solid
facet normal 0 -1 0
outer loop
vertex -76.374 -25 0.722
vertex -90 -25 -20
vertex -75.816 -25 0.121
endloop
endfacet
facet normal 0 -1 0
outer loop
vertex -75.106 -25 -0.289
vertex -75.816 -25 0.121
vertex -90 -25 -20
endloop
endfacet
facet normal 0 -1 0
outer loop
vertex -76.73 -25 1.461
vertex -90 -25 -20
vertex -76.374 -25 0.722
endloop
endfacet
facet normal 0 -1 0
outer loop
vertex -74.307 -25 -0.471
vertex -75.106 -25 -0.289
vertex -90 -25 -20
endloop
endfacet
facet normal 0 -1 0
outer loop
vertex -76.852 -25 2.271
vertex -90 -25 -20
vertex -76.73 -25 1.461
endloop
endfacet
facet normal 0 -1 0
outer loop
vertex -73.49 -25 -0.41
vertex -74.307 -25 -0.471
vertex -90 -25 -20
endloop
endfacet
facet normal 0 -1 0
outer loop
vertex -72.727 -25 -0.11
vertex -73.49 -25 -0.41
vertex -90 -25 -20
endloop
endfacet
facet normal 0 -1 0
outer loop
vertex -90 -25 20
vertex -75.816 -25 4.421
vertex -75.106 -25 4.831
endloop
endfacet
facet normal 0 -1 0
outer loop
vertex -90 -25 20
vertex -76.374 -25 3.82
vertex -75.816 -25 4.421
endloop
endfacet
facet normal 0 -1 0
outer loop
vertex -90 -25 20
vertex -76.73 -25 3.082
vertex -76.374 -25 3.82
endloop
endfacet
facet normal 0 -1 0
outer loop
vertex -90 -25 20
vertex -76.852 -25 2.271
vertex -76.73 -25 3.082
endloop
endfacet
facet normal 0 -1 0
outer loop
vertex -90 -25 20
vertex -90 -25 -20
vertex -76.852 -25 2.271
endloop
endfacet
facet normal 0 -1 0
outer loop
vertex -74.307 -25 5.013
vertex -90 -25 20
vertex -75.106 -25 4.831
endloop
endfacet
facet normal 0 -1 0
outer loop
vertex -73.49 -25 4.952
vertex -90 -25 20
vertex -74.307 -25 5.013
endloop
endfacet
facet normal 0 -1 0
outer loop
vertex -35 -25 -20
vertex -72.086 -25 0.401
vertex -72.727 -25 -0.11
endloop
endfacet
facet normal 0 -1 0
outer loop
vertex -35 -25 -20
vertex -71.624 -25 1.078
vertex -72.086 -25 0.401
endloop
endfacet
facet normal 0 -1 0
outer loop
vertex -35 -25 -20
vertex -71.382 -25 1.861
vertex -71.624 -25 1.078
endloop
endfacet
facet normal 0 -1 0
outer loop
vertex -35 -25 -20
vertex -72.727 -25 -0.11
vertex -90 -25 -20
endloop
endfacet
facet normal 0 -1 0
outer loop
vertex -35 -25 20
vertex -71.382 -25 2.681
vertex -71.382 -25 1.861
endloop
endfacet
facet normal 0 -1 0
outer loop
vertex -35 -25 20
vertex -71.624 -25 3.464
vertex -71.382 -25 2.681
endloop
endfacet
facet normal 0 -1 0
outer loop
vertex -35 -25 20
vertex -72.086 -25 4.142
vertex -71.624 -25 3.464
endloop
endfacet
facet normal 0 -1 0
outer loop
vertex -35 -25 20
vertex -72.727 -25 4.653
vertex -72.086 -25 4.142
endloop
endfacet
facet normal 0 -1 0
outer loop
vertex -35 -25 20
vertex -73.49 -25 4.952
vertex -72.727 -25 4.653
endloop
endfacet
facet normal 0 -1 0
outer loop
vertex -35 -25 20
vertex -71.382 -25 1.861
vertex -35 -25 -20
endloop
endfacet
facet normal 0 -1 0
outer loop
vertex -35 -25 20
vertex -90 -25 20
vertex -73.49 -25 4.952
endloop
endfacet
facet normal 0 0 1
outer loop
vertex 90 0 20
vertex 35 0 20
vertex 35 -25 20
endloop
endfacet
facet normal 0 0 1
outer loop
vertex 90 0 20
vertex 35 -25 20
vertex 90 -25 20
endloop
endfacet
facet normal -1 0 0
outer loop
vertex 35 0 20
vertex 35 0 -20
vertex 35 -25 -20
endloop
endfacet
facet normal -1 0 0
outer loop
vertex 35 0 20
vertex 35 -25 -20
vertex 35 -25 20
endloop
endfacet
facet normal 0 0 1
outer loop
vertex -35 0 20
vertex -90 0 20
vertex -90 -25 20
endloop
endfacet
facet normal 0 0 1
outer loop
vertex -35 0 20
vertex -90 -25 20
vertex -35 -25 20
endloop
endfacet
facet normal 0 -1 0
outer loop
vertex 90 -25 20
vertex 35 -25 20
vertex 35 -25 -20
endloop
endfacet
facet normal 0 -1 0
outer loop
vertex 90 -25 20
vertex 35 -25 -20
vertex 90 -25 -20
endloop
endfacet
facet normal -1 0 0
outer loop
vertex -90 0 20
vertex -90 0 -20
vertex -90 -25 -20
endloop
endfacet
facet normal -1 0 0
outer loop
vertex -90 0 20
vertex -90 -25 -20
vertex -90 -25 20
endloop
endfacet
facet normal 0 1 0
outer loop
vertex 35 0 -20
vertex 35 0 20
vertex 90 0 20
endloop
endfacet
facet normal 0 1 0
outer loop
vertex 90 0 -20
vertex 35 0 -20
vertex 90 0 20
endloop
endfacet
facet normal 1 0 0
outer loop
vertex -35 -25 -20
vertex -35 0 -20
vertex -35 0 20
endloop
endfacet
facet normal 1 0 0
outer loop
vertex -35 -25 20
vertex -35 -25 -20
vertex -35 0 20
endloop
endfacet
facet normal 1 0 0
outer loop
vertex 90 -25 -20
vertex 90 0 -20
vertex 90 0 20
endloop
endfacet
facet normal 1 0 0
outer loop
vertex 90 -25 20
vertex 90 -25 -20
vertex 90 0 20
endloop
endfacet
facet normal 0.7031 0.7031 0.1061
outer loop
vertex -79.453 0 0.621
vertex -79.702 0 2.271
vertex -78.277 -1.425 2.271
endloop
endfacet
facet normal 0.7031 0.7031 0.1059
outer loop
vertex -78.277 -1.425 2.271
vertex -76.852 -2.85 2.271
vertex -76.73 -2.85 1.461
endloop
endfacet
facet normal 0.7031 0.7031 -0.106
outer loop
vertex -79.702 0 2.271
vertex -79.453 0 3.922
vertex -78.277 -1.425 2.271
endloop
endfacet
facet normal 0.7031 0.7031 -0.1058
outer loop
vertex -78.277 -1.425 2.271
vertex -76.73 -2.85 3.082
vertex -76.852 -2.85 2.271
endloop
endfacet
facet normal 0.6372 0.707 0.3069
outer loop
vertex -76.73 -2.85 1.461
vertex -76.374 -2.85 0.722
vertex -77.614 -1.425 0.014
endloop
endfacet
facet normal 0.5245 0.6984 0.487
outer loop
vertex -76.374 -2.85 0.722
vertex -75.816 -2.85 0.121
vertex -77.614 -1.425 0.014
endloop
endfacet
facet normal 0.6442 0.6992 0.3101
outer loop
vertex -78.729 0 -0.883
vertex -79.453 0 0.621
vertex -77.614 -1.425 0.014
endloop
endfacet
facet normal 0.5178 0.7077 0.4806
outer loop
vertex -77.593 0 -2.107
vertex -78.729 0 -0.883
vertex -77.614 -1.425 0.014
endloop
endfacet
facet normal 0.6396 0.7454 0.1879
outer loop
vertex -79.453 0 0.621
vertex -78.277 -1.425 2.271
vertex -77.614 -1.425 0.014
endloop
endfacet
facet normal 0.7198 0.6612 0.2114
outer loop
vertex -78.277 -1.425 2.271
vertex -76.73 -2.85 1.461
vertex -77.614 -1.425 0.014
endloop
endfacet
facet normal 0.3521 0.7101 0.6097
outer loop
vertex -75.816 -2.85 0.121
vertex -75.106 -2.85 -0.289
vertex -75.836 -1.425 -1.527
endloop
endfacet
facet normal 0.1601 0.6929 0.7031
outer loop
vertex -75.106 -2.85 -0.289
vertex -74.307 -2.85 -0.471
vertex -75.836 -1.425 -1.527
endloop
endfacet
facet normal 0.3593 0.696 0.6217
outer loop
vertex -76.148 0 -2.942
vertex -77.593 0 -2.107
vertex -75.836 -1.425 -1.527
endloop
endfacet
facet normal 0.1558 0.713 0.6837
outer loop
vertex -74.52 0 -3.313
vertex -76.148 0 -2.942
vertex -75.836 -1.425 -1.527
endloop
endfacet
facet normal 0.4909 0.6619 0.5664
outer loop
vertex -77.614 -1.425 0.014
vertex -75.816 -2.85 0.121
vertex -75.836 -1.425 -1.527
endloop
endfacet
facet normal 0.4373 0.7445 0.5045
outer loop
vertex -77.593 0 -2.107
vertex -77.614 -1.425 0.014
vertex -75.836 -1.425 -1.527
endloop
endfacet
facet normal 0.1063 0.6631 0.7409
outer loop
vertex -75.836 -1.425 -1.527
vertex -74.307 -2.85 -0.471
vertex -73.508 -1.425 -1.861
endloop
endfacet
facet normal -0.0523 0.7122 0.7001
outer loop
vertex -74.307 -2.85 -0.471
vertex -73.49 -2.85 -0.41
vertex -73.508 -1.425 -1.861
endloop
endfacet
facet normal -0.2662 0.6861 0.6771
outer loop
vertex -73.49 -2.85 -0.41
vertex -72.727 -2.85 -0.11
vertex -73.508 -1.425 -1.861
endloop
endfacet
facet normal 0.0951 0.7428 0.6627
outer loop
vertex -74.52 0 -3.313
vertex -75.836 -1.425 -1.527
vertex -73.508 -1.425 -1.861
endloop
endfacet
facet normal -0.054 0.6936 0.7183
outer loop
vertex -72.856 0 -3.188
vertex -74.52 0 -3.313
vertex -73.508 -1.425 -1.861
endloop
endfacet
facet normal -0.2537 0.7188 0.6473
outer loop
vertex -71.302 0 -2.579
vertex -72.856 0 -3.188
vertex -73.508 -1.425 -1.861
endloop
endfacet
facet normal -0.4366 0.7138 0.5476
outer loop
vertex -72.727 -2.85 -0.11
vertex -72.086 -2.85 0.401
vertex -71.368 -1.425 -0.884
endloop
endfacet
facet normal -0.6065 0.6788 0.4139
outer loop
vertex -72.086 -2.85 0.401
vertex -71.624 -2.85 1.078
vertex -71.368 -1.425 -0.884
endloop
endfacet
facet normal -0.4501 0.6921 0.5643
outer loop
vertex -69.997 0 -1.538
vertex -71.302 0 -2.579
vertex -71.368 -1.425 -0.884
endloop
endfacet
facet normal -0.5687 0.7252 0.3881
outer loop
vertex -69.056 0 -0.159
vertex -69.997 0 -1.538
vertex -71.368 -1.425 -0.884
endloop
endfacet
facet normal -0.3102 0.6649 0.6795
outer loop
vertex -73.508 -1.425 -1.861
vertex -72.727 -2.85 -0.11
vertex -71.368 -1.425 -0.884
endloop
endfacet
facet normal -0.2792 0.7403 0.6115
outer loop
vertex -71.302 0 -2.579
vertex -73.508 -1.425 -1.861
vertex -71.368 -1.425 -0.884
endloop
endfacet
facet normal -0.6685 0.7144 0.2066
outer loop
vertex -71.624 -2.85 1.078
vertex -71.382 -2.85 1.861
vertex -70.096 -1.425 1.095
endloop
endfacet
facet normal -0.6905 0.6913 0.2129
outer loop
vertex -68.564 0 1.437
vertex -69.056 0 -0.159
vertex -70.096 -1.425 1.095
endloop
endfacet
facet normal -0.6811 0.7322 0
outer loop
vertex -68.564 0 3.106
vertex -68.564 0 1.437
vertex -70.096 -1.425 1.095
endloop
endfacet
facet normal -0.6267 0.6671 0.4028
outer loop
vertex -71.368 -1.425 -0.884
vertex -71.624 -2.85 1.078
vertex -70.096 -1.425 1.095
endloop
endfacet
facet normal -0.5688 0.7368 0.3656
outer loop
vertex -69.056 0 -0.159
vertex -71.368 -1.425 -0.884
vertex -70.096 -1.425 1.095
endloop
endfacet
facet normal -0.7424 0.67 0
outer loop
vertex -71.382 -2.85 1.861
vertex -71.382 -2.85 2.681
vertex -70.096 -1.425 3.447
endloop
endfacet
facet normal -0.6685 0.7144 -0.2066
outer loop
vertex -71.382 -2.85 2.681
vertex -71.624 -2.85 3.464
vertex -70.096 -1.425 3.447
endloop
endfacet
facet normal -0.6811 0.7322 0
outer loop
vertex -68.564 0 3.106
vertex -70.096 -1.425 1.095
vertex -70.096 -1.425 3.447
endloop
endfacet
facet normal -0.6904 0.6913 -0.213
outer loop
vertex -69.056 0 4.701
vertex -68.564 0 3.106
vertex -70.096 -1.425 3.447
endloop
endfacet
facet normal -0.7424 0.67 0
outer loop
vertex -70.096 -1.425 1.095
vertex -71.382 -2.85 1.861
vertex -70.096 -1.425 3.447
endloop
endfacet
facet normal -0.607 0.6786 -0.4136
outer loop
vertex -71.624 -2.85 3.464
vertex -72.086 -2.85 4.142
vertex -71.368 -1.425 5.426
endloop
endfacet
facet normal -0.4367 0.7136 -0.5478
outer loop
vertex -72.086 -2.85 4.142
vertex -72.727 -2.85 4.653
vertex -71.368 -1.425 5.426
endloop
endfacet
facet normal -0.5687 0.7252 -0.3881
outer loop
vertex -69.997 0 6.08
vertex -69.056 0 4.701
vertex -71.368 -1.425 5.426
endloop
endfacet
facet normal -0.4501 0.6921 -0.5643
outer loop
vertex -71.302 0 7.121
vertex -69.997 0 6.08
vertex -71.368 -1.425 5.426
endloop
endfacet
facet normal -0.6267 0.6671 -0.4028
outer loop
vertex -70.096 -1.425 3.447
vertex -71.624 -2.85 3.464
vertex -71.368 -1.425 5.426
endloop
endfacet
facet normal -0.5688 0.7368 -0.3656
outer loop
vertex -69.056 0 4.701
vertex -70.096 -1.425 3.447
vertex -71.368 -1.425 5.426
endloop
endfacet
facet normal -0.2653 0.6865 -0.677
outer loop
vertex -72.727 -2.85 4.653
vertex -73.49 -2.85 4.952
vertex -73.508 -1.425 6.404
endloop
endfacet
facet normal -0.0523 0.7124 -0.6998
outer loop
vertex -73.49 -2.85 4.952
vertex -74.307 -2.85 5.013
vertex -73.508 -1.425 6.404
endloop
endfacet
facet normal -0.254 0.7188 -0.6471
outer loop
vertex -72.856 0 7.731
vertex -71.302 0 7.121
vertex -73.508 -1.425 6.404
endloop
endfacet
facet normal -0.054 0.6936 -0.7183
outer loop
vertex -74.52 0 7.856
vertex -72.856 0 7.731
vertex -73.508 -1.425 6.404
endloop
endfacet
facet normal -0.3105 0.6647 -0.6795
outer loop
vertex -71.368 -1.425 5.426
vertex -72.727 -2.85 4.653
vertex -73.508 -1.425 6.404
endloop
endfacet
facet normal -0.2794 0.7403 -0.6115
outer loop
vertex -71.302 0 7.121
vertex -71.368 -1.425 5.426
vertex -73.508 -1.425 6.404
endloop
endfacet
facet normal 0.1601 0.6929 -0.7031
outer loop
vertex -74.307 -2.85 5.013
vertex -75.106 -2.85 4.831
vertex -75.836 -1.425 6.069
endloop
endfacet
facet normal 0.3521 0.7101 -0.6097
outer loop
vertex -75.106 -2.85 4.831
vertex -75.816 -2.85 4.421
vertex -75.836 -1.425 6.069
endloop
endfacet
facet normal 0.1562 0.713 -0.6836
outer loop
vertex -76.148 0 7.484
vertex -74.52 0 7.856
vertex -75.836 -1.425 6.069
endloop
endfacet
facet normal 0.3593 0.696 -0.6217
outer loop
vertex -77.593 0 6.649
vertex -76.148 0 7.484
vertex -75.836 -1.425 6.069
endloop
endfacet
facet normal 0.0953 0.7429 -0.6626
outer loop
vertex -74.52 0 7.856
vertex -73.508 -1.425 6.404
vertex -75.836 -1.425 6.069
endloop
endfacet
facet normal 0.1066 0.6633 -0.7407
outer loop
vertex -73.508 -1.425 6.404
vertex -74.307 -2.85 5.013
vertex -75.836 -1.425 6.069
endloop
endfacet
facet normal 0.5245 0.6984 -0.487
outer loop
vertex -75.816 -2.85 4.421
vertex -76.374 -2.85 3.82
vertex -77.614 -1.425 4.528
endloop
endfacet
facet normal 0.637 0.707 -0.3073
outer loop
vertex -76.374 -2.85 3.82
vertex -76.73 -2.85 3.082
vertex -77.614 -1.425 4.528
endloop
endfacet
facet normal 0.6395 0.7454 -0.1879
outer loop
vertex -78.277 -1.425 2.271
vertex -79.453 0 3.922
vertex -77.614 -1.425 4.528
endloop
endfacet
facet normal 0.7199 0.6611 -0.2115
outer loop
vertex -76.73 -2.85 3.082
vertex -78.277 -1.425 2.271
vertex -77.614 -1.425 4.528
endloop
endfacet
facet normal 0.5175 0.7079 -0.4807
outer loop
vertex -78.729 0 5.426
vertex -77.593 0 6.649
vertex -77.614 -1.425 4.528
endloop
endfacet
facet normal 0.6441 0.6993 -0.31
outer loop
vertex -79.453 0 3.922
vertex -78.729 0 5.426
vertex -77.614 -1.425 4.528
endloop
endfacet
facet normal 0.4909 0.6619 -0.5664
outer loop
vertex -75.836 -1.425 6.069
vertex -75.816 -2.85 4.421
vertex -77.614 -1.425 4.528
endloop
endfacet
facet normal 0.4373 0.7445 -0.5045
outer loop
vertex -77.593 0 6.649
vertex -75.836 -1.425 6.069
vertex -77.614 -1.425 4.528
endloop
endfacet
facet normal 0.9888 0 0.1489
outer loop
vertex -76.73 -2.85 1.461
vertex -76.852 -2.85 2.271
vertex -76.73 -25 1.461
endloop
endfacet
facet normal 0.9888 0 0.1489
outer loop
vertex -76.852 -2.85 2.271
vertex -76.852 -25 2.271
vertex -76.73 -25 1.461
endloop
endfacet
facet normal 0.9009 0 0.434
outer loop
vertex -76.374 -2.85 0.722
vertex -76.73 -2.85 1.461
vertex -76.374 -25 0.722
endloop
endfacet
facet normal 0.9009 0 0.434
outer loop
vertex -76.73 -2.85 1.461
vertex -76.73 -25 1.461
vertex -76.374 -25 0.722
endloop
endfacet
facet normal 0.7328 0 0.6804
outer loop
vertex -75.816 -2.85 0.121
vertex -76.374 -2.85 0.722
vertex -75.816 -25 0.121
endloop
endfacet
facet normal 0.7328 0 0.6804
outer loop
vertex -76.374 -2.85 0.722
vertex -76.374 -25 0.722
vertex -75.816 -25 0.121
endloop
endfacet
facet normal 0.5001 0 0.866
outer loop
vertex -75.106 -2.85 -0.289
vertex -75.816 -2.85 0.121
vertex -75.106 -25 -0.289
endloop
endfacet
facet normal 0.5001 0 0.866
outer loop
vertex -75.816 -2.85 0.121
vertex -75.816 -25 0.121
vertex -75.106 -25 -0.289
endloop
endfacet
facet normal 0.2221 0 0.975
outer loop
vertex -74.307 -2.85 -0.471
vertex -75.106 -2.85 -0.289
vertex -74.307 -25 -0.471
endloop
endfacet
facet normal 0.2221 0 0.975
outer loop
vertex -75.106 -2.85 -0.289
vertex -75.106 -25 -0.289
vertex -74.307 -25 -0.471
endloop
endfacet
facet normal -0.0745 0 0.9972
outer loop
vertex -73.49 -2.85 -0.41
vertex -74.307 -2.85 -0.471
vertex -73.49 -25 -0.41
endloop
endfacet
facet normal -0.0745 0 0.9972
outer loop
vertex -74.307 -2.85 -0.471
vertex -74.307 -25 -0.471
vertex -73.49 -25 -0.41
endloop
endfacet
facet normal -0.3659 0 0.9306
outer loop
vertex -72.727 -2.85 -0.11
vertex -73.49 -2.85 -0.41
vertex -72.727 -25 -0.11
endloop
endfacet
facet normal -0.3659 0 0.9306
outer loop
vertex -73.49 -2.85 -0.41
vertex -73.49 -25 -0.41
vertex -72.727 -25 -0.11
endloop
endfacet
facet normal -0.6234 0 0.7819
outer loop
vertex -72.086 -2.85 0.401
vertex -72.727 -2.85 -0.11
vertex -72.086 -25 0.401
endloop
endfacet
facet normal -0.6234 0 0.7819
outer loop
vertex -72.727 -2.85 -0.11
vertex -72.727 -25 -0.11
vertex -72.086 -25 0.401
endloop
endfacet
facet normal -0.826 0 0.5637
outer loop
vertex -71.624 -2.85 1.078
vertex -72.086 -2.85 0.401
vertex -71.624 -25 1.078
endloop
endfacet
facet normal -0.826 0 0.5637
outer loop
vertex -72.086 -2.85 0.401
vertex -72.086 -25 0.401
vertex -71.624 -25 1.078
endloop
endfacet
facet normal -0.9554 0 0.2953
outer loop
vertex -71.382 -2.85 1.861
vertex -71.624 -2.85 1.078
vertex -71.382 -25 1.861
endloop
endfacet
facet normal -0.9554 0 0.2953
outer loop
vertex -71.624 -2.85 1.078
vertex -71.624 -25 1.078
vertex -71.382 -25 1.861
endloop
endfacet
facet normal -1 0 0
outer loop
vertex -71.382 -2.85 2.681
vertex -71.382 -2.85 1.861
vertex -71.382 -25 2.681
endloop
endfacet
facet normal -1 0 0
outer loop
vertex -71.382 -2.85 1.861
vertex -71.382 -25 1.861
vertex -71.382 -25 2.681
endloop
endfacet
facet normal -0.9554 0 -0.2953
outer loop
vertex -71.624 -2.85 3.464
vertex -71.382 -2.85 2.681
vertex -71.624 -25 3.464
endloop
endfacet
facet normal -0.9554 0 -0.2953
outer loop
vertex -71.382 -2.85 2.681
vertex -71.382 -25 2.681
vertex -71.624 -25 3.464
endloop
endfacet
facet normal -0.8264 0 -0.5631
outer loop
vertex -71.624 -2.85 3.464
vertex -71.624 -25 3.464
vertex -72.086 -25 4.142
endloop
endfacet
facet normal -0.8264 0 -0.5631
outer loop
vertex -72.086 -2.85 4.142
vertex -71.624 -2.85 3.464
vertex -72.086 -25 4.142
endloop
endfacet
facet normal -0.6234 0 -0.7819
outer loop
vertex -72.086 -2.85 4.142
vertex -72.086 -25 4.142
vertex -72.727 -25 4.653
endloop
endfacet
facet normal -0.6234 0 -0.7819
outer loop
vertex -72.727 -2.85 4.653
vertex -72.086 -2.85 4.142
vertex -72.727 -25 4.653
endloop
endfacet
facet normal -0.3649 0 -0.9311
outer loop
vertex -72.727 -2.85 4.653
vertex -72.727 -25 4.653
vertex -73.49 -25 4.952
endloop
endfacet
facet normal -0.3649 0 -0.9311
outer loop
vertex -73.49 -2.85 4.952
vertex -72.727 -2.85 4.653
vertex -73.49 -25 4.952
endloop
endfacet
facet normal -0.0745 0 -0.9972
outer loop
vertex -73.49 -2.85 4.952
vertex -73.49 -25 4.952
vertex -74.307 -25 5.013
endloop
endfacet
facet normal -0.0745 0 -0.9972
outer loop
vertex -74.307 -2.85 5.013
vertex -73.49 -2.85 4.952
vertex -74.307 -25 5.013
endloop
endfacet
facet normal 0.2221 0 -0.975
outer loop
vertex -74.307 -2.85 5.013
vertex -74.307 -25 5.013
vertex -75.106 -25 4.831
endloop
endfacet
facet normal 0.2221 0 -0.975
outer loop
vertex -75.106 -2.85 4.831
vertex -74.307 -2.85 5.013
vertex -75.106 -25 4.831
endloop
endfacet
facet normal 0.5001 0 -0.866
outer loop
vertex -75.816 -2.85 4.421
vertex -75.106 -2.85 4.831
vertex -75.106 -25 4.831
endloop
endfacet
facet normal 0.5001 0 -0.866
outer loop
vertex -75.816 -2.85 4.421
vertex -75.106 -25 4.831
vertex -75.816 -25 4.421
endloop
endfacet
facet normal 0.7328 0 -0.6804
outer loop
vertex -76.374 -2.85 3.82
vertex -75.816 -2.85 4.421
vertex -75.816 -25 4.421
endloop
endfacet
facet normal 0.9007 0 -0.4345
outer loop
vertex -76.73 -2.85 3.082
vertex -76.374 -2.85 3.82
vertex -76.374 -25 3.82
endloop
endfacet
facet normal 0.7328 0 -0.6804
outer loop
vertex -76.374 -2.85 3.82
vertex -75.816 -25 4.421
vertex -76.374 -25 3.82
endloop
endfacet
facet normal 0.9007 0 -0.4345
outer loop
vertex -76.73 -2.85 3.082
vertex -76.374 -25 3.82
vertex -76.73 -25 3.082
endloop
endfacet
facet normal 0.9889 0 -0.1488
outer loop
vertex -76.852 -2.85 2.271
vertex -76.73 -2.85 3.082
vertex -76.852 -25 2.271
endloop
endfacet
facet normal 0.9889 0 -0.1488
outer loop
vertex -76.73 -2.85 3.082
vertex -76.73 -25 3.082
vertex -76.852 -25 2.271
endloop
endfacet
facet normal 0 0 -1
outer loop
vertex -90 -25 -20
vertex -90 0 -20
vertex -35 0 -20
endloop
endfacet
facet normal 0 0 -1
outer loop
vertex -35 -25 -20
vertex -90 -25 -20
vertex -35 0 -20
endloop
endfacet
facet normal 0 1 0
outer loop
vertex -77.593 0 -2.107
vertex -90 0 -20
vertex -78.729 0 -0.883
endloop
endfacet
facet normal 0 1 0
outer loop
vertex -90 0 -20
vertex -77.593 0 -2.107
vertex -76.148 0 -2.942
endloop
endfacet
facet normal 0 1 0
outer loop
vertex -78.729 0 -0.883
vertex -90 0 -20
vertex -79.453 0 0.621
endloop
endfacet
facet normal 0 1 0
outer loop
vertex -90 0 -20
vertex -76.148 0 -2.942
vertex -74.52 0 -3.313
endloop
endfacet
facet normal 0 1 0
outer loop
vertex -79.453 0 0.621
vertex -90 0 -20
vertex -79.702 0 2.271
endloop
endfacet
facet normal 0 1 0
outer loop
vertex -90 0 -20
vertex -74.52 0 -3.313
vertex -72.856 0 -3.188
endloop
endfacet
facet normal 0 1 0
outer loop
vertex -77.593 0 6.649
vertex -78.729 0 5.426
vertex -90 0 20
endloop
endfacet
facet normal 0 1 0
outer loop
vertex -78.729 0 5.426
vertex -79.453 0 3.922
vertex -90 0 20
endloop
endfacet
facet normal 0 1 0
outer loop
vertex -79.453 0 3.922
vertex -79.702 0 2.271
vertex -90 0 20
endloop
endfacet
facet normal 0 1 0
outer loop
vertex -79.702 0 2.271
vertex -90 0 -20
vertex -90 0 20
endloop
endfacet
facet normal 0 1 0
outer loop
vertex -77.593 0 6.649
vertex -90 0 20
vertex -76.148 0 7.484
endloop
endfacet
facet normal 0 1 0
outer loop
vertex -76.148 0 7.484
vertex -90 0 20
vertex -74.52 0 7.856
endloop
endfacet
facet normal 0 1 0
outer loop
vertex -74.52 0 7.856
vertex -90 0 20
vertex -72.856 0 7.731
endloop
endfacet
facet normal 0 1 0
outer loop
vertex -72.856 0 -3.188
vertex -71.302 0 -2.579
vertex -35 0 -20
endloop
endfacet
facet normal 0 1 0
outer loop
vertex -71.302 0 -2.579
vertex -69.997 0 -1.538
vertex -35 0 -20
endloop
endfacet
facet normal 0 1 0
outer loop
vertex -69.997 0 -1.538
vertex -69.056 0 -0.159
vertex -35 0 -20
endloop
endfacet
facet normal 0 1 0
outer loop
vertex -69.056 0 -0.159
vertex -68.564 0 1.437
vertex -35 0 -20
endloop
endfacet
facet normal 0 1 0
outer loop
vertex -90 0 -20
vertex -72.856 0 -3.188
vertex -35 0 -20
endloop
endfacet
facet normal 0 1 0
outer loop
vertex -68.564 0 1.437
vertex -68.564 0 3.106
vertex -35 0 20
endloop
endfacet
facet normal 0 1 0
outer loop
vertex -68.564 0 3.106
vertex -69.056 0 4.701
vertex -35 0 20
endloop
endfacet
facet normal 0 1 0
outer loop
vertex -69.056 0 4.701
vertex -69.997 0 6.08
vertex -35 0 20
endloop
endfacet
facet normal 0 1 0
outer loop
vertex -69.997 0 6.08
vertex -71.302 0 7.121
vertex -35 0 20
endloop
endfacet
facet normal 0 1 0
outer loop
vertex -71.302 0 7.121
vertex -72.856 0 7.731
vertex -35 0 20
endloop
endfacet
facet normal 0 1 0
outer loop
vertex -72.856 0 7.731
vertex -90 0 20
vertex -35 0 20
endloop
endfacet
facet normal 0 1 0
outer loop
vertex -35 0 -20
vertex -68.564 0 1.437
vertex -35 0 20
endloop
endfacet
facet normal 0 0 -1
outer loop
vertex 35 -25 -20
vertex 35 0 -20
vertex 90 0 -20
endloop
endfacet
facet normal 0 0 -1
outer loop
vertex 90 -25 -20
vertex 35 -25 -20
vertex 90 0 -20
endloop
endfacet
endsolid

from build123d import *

# Parameters (mm, degrees)
F0_W           = 54.999999851
F0_H           = 40
F1_DEPTH       = 25
F0_W_2         = 55
F2_D           = 5.5
F2_CSINK_D     = 11.2
F2_CSINK_ANGLE = 90


with BuildPart() as f1:
    # F0 (on Front) → F1 (new body)
    with BuildSketch(Plane.XZ):
        with Locations((-62.5000000745, 0)):
            Rectangle(F0_W, F0_H)
    extrude(amount=F1_DEPTH)

    # F2 (through all)
    with Locations(Plane(origin=(0, 0, 0), x_dir=(1, 0, 0), z_dir=(0, 1, 0))):
        with Locations((-74.10171628, -2.2711590864)):
            CounterSinkHole(F2_D / 2, F2_CSINK_D / 2, counter_sink_angle=F2_CSINK_ANGLE)


with BuildPart() as f1b:
    # F0 (on Front) → F1, piece 2 (new body)
    with BuildSketch(Plane.XZ):
        with Locations((62.5, 0)):
            Rectangle(F0_W_2, F0_H)
    extrude(amount=F1_DEPTH)


solid = Compound([f1.part, f1b.part])
